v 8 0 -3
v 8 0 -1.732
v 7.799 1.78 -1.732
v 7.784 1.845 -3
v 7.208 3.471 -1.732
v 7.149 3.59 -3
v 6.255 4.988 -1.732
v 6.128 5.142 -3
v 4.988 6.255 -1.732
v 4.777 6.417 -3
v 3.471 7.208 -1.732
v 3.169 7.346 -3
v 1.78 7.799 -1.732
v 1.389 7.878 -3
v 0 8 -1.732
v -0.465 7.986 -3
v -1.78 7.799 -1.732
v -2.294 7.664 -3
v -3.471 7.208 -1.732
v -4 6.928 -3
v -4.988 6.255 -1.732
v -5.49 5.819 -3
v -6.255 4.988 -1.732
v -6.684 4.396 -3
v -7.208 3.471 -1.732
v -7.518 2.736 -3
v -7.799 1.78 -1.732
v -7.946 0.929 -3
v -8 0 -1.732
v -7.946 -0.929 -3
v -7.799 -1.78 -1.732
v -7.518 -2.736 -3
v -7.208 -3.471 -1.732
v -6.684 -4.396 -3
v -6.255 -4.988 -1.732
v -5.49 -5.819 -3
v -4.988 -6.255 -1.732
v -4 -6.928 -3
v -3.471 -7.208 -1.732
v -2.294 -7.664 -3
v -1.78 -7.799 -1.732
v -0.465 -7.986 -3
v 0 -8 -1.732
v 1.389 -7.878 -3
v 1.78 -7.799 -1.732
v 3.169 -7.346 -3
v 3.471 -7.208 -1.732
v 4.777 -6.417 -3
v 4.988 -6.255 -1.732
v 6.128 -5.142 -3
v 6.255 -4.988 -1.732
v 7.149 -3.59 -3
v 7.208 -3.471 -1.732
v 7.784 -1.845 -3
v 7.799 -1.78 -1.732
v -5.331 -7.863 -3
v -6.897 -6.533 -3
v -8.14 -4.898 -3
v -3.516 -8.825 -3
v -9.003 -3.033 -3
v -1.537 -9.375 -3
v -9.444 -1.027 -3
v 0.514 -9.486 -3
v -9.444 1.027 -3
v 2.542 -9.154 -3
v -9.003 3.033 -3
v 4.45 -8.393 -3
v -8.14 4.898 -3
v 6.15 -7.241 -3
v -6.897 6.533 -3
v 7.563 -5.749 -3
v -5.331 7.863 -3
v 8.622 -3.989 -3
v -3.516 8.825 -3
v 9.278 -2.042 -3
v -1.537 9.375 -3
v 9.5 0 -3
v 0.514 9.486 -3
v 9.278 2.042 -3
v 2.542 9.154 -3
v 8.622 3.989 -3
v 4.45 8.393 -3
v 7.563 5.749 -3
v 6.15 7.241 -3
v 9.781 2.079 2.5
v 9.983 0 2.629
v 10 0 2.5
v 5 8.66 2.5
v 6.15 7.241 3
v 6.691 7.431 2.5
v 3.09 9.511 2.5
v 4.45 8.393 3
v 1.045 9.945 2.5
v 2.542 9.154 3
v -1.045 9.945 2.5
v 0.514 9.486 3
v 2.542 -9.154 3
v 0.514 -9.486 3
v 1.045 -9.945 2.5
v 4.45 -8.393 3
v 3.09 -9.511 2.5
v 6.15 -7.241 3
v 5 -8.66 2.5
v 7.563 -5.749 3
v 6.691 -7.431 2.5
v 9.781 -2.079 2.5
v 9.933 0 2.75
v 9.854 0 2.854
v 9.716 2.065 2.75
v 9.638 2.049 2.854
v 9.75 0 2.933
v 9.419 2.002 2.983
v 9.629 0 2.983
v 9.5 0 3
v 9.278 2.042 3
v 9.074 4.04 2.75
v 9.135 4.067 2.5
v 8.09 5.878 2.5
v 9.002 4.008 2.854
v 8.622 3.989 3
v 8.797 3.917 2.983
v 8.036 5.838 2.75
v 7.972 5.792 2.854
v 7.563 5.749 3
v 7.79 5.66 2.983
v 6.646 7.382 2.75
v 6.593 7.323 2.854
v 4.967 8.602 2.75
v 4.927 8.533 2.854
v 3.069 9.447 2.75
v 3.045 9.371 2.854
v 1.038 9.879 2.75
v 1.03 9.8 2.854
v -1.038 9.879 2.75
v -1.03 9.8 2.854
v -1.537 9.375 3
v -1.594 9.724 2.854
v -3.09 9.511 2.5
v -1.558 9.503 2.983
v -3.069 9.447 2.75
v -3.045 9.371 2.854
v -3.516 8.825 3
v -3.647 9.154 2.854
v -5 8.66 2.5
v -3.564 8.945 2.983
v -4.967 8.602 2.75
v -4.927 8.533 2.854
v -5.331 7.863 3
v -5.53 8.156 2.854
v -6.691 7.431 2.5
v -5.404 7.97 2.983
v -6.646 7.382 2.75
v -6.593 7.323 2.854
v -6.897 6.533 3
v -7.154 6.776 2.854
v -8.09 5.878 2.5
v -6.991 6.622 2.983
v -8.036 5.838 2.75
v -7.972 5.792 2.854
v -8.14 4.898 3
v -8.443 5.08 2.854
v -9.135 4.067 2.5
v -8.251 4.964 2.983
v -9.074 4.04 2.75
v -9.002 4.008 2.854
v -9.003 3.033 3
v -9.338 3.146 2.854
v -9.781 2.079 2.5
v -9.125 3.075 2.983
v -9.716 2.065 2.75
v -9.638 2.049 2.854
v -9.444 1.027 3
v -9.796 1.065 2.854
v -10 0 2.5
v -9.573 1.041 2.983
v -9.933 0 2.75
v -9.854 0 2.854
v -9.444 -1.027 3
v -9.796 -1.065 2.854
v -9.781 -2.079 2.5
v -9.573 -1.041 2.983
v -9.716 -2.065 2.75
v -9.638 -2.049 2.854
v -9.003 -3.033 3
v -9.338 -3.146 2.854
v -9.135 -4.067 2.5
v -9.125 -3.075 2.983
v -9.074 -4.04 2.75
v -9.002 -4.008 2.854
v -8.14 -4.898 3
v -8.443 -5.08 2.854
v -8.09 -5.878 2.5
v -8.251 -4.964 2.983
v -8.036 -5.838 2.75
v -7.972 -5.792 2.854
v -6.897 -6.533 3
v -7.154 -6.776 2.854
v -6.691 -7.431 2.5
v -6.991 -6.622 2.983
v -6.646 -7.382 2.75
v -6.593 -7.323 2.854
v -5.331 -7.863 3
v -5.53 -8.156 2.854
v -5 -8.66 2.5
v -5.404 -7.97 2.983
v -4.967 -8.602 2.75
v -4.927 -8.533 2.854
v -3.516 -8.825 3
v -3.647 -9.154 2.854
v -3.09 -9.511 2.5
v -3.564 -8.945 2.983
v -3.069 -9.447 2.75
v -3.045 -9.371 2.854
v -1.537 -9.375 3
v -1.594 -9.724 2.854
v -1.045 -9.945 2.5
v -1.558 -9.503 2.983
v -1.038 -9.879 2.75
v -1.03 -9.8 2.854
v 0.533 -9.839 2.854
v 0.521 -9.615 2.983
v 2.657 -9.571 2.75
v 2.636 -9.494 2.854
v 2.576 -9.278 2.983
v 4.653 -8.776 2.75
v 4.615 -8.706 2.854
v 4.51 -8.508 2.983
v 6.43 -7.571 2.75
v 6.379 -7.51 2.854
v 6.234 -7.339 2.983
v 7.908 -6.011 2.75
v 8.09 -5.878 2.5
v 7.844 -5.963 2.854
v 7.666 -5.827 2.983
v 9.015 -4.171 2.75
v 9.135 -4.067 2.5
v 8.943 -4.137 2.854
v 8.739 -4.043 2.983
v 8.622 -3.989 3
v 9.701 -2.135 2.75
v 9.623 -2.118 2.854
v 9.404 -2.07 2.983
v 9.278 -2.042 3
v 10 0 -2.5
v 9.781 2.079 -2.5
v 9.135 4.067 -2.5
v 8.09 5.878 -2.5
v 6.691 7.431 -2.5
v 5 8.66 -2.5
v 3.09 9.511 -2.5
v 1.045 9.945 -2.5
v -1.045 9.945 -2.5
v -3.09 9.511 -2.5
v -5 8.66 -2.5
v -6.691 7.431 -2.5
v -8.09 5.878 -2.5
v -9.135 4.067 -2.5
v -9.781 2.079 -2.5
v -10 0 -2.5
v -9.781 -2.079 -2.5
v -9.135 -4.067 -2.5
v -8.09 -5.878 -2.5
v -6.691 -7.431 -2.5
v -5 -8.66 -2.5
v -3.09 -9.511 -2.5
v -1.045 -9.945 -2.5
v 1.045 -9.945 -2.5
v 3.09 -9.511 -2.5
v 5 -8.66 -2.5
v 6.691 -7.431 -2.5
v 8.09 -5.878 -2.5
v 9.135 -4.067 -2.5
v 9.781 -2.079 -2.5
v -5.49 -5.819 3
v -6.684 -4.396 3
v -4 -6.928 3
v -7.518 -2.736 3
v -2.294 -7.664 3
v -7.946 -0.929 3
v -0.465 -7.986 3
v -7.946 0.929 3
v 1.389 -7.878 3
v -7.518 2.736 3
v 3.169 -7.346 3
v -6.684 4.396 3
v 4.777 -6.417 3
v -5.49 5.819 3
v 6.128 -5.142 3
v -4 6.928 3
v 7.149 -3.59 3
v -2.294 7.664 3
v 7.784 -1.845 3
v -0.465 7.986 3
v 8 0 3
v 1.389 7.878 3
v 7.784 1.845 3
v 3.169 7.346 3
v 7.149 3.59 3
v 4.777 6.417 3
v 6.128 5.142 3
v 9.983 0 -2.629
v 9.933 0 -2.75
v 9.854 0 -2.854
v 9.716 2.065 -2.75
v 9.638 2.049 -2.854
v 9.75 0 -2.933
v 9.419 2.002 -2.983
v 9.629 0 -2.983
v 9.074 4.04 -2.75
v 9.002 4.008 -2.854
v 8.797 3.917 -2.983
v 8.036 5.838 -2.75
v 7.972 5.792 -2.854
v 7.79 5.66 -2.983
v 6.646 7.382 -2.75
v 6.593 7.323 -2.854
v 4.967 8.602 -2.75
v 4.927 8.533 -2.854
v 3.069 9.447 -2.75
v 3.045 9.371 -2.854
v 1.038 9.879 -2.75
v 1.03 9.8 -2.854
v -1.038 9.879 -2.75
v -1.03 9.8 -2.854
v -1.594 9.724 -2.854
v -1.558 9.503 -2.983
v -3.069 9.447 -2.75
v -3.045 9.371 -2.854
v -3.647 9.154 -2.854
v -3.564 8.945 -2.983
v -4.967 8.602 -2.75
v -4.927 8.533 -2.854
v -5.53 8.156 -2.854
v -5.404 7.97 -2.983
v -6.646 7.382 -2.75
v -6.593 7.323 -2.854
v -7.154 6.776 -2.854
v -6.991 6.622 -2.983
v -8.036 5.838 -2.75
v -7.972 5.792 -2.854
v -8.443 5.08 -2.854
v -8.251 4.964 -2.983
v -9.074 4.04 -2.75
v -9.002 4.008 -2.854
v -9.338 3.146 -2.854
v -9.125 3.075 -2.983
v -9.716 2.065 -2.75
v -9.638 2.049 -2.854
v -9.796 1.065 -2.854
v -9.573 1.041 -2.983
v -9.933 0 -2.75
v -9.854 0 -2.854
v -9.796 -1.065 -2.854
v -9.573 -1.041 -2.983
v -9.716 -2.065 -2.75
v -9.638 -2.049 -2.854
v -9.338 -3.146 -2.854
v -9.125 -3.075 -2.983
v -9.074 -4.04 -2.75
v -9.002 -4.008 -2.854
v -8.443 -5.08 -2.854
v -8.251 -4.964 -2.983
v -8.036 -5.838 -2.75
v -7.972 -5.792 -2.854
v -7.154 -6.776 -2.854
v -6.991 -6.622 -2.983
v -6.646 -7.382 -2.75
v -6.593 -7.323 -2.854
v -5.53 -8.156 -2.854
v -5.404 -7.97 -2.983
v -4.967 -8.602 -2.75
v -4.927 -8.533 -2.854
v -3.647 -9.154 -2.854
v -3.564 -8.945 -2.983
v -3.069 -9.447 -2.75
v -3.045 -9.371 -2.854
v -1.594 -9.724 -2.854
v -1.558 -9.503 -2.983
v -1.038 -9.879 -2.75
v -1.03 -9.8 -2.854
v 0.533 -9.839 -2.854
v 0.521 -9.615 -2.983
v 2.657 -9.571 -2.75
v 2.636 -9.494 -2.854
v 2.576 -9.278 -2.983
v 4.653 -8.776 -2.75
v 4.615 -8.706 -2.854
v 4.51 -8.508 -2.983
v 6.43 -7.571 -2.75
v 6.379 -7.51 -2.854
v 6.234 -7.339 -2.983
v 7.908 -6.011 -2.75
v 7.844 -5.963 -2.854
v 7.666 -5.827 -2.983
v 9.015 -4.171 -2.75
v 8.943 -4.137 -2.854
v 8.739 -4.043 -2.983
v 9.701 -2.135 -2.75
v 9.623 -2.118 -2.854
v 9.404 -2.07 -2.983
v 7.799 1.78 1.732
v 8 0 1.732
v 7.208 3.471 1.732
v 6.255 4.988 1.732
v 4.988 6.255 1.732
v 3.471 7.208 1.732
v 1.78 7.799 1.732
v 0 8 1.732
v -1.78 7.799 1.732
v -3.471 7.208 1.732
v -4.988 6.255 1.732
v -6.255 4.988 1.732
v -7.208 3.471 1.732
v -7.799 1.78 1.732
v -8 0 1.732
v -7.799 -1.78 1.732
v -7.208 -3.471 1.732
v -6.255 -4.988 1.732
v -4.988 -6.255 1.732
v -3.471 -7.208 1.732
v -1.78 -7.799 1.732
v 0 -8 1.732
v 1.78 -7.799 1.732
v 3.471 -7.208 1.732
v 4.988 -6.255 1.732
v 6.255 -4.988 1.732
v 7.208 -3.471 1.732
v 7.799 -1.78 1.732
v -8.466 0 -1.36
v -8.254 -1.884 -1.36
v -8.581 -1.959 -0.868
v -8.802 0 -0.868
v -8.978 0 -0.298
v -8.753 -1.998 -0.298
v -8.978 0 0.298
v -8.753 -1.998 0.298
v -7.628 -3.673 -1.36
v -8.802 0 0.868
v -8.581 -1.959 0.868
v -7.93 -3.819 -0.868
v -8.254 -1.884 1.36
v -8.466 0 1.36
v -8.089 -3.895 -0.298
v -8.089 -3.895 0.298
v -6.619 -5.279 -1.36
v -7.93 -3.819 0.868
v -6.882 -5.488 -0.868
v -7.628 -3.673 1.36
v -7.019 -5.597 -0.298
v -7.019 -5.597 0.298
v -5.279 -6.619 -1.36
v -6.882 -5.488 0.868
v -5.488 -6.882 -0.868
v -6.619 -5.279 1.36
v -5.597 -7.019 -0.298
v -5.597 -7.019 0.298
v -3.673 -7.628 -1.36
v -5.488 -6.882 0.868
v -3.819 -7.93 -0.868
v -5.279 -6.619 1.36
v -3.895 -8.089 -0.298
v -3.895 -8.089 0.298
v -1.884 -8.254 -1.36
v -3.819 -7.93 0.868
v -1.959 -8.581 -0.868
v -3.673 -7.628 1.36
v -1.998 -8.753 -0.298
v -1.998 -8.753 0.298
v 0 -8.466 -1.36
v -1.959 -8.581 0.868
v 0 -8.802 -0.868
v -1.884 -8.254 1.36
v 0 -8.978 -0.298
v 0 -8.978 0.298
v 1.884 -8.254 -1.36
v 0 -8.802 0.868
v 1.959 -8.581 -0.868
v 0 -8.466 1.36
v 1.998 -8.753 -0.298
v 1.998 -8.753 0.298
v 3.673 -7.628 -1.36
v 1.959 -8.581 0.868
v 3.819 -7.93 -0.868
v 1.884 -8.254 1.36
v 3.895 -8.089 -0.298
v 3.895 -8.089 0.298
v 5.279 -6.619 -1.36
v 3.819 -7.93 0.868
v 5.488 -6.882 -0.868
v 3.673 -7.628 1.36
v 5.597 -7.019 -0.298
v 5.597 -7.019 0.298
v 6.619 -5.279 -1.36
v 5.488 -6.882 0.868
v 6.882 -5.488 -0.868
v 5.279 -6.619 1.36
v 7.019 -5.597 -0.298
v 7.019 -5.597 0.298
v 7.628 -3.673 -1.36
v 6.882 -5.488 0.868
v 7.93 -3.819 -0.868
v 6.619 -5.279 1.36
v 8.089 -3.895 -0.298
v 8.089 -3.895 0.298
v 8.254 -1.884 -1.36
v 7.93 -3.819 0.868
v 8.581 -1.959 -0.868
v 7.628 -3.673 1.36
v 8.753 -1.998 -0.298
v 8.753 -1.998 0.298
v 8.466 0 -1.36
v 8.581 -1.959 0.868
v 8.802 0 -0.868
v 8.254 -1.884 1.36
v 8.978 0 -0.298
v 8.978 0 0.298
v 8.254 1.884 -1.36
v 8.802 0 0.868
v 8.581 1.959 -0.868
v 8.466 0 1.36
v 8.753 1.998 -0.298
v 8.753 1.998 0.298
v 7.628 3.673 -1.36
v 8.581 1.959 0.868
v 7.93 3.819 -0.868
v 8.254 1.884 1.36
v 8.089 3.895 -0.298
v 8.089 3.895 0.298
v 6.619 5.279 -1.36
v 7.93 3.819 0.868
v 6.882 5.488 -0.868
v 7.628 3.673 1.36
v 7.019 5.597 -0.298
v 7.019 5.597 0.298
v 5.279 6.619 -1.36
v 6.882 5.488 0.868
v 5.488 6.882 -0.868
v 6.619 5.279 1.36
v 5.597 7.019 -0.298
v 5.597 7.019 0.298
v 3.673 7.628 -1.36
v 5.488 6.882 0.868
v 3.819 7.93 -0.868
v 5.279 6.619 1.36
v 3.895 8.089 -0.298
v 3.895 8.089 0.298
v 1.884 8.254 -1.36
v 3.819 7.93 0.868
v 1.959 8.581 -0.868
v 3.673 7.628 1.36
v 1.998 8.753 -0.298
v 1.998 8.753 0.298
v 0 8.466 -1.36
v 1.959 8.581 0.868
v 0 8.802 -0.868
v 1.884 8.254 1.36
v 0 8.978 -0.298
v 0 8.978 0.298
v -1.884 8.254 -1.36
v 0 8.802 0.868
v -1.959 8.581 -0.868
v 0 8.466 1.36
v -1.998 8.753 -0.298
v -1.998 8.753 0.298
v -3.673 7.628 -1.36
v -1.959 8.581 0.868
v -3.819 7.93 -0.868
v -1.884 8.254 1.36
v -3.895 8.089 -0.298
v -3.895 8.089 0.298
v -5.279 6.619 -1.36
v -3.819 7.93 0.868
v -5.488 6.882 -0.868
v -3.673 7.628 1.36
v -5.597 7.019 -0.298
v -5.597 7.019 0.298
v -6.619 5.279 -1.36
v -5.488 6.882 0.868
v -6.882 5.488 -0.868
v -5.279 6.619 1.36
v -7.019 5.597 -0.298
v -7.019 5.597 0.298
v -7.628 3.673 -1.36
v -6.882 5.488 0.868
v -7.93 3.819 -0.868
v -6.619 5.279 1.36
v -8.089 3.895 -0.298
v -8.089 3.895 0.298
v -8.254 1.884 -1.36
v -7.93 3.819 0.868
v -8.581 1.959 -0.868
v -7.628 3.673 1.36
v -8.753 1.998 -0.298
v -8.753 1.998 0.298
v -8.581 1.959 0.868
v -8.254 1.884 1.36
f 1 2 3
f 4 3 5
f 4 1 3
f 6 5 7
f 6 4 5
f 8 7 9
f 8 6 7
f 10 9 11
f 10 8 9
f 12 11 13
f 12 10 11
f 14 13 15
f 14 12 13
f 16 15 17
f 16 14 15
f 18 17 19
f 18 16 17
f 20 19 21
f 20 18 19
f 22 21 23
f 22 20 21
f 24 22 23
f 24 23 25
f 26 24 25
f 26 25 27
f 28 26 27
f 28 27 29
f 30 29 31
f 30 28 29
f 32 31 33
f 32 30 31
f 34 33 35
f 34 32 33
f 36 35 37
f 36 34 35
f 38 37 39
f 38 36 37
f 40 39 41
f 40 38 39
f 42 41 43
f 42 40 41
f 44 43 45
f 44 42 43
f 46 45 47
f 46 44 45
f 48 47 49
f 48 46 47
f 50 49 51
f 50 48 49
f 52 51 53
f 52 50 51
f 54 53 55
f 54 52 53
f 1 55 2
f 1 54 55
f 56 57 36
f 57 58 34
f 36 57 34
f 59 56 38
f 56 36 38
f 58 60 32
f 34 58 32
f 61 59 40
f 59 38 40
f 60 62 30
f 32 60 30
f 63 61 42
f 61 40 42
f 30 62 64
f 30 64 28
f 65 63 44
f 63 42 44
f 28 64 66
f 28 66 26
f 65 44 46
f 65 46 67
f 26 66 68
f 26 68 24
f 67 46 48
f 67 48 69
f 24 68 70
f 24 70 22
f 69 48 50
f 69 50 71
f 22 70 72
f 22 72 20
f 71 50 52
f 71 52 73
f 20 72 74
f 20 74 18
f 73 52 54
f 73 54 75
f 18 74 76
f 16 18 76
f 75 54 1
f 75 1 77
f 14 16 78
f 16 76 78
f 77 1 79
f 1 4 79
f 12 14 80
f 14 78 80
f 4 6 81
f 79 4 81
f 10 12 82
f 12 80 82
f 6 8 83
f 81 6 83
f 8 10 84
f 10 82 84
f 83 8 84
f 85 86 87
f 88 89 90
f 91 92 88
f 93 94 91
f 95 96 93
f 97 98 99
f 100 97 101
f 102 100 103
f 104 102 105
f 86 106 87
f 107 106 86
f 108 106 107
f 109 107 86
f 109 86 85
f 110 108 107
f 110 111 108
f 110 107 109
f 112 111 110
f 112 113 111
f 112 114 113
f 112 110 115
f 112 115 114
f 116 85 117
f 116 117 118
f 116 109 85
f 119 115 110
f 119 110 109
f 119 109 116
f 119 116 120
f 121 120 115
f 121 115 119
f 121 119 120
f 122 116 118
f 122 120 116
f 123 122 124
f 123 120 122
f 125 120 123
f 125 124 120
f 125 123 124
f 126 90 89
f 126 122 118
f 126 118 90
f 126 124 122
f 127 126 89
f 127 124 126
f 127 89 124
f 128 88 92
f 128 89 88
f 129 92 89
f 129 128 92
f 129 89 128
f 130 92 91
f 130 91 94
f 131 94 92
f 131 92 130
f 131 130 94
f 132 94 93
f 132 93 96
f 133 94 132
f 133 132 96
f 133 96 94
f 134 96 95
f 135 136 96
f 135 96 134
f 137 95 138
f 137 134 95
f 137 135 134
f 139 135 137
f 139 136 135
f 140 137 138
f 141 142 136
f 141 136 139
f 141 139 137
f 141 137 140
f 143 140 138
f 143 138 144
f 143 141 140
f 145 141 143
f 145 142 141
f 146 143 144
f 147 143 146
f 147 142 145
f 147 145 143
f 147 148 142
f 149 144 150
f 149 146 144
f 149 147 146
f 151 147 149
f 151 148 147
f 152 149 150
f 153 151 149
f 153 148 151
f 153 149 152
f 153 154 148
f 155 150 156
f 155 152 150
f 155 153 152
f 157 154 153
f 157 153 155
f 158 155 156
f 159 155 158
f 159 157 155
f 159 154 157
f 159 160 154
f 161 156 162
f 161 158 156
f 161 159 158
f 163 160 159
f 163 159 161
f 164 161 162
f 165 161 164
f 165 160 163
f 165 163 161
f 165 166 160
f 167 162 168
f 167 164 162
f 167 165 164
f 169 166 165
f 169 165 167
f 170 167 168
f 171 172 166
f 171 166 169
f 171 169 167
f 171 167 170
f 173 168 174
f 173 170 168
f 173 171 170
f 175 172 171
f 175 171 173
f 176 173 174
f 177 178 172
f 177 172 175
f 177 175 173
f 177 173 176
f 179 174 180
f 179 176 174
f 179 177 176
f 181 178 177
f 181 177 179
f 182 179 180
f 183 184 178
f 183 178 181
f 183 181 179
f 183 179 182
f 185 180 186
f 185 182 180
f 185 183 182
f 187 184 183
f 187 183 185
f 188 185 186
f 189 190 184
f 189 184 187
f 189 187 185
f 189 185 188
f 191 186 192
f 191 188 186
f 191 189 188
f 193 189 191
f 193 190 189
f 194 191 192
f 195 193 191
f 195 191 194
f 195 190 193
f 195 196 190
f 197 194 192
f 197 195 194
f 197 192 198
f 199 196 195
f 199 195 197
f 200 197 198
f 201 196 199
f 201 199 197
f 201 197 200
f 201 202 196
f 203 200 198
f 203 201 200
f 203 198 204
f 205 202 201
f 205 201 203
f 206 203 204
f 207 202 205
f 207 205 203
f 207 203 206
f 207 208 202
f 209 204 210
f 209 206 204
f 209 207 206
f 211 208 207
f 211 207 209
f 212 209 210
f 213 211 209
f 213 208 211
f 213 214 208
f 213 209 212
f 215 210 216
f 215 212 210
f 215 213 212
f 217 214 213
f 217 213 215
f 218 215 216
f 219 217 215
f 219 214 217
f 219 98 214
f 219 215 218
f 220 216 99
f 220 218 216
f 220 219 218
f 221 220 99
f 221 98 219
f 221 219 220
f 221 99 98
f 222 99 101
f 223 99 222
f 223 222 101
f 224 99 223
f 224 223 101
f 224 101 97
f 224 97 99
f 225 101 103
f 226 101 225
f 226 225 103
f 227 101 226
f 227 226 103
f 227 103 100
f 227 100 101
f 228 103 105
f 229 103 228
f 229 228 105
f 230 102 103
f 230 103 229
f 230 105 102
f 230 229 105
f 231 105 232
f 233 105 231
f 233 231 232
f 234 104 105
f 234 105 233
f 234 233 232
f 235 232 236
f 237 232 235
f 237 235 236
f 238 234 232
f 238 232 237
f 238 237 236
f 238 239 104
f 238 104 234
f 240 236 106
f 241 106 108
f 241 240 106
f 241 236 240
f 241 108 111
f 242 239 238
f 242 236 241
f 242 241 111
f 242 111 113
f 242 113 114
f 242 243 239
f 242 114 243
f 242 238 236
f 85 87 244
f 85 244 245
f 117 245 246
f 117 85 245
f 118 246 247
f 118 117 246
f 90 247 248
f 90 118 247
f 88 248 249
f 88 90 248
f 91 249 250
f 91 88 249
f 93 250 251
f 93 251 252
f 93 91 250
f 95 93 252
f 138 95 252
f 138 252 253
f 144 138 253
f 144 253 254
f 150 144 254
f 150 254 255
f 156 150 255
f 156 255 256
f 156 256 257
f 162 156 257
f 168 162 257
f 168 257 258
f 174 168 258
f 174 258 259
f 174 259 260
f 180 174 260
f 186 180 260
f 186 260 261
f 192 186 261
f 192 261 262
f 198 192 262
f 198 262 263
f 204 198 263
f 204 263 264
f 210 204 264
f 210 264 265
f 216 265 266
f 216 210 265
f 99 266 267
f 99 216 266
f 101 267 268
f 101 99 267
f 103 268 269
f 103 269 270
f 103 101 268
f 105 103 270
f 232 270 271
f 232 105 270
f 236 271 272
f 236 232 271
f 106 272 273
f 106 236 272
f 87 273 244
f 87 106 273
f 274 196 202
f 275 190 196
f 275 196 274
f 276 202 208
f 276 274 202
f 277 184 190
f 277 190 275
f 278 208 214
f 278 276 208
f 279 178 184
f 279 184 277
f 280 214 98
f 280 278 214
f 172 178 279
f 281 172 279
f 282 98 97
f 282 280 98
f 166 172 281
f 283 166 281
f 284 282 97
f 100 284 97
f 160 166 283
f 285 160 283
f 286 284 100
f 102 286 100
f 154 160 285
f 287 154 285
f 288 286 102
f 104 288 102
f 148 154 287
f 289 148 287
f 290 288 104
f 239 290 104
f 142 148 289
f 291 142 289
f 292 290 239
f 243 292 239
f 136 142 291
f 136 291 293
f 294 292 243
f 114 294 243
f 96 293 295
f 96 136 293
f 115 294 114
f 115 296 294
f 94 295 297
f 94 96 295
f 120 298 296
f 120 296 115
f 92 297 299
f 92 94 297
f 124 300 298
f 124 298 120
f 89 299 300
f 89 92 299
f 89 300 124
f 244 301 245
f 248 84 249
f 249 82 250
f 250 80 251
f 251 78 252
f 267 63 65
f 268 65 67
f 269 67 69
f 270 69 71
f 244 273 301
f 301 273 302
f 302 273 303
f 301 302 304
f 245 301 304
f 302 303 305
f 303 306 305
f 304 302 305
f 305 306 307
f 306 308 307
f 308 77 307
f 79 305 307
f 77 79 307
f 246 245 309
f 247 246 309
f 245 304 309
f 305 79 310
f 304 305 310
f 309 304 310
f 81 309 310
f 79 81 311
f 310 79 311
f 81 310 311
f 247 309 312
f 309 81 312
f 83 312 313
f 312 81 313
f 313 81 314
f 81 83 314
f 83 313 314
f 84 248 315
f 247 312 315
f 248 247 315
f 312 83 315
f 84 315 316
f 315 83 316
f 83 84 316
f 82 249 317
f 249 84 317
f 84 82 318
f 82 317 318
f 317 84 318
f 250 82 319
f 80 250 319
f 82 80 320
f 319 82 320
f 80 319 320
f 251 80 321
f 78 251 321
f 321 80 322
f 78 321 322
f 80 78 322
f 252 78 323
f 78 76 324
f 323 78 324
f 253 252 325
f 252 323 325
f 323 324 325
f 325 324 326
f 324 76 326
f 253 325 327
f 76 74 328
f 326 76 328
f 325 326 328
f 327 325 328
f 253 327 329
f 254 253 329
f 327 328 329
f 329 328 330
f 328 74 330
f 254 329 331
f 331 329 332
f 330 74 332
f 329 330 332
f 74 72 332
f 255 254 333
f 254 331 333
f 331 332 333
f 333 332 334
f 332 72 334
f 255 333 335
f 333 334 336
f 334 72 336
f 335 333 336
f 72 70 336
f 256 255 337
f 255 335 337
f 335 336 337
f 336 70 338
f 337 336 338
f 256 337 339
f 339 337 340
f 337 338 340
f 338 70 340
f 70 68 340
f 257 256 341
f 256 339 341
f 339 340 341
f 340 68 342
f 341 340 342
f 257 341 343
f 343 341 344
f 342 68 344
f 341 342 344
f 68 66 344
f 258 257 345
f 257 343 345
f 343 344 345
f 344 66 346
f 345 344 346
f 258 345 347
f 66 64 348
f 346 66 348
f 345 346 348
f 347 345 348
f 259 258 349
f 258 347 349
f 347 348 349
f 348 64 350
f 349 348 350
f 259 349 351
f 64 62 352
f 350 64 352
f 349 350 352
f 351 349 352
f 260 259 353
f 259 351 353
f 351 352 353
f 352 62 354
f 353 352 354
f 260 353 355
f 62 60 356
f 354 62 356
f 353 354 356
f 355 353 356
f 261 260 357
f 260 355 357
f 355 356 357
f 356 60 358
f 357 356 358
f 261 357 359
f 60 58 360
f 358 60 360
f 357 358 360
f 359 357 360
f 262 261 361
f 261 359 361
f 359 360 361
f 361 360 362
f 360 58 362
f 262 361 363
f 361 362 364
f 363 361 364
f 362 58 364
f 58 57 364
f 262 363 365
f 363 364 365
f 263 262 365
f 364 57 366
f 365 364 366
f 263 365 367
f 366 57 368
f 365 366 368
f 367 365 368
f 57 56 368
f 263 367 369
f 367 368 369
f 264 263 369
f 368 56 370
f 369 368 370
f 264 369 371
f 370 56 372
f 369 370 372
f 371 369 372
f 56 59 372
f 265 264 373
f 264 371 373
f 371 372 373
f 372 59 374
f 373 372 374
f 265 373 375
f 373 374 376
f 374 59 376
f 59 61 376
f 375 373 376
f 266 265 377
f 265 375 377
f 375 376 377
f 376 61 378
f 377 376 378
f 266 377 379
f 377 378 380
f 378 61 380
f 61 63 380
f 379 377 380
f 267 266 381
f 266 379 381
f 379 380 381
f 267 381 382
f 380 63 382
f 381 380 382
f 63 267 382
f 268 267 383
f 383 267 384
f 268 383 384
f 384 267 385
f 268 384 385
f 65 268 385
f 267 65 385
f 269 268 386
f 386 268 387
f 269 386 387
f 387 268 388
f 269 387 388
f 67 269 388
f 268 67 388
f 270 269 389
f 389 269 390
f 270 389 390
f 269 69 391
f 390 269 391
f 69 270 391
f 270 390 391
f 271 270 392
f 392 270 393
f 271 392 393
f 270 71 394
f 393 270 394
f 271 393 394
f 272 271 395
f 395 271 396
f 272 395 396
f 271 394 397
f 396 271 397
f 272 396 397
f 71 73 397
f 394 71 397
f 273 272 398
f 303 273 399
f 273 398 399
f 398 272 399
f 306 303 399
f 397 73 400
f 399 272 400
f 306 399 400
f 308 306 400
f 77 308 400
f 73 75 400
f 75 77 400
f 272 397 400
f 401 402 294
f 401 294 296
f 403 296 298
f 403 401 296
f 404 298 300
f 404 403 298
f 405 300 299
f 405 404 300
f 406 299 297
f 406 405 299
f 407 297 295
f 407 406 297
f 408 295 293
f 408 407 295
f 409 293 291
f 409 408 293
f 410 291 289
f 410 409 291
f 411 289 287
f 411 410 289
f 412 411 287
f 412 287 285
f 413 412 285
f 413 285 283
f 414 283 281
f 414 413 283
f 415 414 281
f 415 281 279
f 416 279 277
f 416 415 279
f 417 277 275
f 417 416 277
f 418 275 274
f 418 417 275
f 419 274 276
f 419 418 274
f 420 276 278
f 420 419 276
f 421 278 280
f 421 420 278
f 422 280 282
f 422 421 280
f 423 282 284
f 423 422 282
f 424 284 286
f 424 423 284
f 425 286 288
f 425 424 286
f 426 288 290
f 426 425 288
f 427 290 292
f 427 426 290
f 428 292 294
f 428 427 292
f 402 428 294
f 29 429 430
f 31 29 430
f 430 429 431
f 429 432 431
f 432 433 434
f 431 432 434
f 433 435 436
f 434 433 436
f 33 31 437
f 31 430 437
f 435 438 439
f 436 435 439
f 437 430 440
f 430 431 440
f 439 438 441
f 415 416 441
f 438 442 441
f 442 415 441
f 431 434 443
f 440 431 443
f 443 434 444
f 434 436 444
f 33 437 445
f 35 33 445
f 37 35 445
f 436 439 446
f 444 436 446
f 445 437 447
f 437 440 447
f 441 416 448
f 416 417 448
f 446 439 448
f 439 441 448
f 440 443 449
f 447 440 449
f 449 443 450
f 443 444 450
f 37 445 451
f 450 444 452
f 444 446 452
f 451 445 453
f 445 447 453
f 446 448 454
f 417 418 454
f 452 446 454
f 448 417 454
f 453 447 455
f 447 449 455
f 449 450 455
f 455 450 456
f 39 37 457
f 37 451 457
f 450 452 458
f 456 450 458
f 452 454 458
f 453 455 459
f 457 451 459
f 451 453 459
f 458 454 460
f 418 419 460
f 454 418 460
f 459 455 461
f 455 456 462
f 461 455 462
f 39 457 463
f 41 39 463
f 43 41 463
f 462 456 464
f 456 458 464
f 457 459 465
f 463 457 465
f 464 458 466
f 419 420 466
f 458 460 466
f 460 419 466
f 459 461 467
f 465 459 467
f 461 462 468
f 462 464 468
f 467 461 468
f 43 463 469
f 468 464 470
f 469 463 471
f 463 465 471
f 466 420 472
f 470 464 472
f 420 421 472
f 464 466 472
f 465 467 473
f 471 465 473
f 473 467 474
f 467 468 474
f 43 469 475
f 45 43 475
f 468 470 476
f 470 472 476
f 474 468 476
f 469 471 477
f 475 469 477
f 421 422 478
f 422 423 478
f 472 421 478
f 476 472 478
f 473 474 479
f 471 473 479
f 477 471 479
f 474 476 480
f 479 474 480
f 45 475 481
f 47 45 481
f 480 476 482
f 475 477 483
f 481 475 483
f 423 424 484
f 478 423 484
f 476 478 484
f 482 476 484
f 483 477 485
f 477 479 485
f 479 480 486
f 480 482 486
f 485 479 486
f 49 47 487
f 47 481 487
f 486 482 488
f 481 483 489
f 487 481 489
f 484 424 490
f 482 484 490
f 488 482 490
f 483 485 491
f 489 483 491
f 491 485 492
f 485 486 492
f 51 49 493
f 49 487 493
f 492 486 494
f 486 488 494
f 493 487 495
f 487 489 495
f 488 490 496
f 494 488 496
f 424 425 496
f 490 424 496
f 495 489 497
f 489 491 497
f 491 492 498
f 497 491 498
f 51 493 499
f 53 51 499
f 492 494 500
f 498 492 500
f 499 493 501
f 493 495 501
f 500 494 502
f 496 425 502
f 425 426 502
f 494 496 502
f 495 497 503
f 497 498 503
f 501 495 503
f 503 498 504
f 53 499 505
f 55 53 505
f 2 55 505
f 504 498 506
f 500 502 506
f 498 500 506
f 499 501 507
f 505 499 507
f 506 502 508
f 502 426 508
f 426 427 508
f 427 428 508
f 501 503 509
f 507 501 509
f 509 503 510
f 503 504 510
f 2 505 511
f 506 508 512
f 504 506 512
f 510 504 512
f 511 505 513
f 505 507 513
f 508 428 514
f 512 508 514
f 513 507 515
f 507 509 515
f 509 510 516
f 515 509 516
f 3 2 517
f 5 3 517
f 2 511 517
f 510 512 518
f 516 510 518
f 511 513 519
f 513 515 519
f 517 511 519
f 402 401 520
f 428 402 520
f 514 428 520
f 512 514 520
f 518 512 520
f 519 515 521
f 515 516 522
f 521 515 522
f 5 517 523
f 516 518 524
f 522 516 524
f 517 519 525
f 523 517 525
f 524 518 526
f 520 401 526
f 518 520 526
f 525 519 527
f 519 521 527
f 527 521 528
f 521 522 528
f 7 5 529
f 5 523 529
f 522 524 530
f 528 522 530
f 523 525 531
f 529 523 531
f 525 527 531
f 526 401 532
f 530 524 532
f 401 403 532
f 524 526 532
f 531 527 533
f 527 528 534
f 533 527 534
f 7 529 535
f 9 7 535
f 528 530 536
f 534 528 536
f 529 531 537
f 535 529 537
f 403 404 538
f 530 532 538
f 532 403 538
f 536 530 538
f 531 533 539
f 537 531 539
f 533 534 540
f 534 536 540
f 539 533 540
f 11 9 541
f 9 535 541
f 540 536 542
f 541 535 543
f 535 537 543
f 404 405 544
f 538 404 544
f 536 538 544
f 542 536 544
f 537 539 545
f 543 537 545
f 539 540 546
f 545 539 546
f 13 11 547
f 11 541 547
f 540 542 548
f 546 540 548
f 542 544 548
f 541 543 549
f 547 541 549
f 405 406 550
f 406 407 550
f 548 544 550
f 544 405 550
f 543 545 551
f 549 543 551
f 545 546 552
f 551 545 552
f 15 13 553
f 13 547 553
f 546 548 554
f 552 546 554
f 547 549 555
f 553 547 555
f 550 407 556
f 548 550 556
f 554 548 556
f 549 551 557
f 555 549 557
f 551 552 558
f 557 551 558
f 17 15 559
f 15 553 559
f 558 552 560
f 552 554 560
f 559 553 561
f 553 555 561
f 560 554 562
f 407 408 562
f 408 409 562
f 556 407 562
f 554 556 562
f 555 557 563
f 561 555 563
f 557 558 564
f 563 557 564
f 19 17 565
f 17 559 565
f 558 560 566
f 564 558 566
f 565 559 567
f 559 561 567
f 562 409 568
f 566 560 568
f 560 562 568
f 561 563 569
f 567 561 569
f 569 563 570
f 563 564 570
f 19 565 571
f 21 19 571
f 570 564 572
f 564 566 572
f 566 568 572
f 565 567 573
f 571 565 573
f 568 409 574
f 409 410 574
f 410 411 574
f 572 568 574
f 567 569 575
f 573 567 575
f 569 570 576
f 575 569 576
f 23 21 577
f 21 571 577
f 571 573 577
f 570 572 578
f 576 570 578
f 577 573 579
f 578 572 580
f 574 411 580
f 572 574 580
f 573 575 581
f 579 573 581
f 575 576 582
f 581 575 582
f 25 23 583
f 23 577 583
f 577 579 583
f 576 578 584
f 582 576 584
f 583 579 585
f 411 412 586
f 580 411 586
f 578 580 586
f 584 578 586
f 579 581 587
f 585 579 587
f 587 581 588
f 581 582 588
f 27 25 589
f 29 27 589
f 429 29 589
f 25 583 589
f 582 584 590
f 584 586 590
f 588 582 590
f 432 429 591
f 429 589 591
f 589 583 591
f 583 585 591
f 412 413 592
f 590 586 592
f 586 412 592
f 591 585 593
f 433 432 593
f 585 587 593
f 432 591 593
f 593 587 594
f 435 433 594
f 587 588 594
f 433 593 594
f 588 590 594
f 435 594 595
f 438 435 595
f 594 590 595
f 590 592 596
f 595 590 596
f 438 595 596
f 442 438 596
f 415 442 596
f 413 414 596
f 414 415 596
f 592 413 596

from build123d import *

# Parameters (mm, degrees)
SKETCH1_R           = 10
SKETCH1_R_2         = 8
BOSS_EXTRUDE1_DEPTH = 3
SKETCH2_R           = 2
FILLET1_R           = 0.5


with BuildPart() as part:
    # Sketch1 → Boss-Extrude1 (new, symmetric)
    with BuildSketch(Plane.XY):
        Circle(SKETCH1_R)
        Circle(SKETCH1_R_2, mode=Mode.SUBTRACT)
    extrude(amount=BOSS_EXTRUDE1_DEPTH, both=True)

    # Sketch2 → Cut-Revolve1 (revolve, cut)
    with BuildSketch(Plane(origin=(0, 0, 0), x_dir=(1, 0, 0), z_dir=(0, 1, 0))):
        with Locations((-7, 0)):
            Circle(SKETCH2_R)
    revolve(axis=Axis((0, 0, -1.800319694), (0, 0, 1)), mode=Mode.SUBTRACT)

    # Fillet1
    fillet1_edges = [part.edges().sort_by_distance(p)[0] for p in [
        (-10, 0, -3),
        (-10, 0, 3),
    ]]
    fillet(fillet1_edges, radius=FILLET1_R)


solid = part.part
